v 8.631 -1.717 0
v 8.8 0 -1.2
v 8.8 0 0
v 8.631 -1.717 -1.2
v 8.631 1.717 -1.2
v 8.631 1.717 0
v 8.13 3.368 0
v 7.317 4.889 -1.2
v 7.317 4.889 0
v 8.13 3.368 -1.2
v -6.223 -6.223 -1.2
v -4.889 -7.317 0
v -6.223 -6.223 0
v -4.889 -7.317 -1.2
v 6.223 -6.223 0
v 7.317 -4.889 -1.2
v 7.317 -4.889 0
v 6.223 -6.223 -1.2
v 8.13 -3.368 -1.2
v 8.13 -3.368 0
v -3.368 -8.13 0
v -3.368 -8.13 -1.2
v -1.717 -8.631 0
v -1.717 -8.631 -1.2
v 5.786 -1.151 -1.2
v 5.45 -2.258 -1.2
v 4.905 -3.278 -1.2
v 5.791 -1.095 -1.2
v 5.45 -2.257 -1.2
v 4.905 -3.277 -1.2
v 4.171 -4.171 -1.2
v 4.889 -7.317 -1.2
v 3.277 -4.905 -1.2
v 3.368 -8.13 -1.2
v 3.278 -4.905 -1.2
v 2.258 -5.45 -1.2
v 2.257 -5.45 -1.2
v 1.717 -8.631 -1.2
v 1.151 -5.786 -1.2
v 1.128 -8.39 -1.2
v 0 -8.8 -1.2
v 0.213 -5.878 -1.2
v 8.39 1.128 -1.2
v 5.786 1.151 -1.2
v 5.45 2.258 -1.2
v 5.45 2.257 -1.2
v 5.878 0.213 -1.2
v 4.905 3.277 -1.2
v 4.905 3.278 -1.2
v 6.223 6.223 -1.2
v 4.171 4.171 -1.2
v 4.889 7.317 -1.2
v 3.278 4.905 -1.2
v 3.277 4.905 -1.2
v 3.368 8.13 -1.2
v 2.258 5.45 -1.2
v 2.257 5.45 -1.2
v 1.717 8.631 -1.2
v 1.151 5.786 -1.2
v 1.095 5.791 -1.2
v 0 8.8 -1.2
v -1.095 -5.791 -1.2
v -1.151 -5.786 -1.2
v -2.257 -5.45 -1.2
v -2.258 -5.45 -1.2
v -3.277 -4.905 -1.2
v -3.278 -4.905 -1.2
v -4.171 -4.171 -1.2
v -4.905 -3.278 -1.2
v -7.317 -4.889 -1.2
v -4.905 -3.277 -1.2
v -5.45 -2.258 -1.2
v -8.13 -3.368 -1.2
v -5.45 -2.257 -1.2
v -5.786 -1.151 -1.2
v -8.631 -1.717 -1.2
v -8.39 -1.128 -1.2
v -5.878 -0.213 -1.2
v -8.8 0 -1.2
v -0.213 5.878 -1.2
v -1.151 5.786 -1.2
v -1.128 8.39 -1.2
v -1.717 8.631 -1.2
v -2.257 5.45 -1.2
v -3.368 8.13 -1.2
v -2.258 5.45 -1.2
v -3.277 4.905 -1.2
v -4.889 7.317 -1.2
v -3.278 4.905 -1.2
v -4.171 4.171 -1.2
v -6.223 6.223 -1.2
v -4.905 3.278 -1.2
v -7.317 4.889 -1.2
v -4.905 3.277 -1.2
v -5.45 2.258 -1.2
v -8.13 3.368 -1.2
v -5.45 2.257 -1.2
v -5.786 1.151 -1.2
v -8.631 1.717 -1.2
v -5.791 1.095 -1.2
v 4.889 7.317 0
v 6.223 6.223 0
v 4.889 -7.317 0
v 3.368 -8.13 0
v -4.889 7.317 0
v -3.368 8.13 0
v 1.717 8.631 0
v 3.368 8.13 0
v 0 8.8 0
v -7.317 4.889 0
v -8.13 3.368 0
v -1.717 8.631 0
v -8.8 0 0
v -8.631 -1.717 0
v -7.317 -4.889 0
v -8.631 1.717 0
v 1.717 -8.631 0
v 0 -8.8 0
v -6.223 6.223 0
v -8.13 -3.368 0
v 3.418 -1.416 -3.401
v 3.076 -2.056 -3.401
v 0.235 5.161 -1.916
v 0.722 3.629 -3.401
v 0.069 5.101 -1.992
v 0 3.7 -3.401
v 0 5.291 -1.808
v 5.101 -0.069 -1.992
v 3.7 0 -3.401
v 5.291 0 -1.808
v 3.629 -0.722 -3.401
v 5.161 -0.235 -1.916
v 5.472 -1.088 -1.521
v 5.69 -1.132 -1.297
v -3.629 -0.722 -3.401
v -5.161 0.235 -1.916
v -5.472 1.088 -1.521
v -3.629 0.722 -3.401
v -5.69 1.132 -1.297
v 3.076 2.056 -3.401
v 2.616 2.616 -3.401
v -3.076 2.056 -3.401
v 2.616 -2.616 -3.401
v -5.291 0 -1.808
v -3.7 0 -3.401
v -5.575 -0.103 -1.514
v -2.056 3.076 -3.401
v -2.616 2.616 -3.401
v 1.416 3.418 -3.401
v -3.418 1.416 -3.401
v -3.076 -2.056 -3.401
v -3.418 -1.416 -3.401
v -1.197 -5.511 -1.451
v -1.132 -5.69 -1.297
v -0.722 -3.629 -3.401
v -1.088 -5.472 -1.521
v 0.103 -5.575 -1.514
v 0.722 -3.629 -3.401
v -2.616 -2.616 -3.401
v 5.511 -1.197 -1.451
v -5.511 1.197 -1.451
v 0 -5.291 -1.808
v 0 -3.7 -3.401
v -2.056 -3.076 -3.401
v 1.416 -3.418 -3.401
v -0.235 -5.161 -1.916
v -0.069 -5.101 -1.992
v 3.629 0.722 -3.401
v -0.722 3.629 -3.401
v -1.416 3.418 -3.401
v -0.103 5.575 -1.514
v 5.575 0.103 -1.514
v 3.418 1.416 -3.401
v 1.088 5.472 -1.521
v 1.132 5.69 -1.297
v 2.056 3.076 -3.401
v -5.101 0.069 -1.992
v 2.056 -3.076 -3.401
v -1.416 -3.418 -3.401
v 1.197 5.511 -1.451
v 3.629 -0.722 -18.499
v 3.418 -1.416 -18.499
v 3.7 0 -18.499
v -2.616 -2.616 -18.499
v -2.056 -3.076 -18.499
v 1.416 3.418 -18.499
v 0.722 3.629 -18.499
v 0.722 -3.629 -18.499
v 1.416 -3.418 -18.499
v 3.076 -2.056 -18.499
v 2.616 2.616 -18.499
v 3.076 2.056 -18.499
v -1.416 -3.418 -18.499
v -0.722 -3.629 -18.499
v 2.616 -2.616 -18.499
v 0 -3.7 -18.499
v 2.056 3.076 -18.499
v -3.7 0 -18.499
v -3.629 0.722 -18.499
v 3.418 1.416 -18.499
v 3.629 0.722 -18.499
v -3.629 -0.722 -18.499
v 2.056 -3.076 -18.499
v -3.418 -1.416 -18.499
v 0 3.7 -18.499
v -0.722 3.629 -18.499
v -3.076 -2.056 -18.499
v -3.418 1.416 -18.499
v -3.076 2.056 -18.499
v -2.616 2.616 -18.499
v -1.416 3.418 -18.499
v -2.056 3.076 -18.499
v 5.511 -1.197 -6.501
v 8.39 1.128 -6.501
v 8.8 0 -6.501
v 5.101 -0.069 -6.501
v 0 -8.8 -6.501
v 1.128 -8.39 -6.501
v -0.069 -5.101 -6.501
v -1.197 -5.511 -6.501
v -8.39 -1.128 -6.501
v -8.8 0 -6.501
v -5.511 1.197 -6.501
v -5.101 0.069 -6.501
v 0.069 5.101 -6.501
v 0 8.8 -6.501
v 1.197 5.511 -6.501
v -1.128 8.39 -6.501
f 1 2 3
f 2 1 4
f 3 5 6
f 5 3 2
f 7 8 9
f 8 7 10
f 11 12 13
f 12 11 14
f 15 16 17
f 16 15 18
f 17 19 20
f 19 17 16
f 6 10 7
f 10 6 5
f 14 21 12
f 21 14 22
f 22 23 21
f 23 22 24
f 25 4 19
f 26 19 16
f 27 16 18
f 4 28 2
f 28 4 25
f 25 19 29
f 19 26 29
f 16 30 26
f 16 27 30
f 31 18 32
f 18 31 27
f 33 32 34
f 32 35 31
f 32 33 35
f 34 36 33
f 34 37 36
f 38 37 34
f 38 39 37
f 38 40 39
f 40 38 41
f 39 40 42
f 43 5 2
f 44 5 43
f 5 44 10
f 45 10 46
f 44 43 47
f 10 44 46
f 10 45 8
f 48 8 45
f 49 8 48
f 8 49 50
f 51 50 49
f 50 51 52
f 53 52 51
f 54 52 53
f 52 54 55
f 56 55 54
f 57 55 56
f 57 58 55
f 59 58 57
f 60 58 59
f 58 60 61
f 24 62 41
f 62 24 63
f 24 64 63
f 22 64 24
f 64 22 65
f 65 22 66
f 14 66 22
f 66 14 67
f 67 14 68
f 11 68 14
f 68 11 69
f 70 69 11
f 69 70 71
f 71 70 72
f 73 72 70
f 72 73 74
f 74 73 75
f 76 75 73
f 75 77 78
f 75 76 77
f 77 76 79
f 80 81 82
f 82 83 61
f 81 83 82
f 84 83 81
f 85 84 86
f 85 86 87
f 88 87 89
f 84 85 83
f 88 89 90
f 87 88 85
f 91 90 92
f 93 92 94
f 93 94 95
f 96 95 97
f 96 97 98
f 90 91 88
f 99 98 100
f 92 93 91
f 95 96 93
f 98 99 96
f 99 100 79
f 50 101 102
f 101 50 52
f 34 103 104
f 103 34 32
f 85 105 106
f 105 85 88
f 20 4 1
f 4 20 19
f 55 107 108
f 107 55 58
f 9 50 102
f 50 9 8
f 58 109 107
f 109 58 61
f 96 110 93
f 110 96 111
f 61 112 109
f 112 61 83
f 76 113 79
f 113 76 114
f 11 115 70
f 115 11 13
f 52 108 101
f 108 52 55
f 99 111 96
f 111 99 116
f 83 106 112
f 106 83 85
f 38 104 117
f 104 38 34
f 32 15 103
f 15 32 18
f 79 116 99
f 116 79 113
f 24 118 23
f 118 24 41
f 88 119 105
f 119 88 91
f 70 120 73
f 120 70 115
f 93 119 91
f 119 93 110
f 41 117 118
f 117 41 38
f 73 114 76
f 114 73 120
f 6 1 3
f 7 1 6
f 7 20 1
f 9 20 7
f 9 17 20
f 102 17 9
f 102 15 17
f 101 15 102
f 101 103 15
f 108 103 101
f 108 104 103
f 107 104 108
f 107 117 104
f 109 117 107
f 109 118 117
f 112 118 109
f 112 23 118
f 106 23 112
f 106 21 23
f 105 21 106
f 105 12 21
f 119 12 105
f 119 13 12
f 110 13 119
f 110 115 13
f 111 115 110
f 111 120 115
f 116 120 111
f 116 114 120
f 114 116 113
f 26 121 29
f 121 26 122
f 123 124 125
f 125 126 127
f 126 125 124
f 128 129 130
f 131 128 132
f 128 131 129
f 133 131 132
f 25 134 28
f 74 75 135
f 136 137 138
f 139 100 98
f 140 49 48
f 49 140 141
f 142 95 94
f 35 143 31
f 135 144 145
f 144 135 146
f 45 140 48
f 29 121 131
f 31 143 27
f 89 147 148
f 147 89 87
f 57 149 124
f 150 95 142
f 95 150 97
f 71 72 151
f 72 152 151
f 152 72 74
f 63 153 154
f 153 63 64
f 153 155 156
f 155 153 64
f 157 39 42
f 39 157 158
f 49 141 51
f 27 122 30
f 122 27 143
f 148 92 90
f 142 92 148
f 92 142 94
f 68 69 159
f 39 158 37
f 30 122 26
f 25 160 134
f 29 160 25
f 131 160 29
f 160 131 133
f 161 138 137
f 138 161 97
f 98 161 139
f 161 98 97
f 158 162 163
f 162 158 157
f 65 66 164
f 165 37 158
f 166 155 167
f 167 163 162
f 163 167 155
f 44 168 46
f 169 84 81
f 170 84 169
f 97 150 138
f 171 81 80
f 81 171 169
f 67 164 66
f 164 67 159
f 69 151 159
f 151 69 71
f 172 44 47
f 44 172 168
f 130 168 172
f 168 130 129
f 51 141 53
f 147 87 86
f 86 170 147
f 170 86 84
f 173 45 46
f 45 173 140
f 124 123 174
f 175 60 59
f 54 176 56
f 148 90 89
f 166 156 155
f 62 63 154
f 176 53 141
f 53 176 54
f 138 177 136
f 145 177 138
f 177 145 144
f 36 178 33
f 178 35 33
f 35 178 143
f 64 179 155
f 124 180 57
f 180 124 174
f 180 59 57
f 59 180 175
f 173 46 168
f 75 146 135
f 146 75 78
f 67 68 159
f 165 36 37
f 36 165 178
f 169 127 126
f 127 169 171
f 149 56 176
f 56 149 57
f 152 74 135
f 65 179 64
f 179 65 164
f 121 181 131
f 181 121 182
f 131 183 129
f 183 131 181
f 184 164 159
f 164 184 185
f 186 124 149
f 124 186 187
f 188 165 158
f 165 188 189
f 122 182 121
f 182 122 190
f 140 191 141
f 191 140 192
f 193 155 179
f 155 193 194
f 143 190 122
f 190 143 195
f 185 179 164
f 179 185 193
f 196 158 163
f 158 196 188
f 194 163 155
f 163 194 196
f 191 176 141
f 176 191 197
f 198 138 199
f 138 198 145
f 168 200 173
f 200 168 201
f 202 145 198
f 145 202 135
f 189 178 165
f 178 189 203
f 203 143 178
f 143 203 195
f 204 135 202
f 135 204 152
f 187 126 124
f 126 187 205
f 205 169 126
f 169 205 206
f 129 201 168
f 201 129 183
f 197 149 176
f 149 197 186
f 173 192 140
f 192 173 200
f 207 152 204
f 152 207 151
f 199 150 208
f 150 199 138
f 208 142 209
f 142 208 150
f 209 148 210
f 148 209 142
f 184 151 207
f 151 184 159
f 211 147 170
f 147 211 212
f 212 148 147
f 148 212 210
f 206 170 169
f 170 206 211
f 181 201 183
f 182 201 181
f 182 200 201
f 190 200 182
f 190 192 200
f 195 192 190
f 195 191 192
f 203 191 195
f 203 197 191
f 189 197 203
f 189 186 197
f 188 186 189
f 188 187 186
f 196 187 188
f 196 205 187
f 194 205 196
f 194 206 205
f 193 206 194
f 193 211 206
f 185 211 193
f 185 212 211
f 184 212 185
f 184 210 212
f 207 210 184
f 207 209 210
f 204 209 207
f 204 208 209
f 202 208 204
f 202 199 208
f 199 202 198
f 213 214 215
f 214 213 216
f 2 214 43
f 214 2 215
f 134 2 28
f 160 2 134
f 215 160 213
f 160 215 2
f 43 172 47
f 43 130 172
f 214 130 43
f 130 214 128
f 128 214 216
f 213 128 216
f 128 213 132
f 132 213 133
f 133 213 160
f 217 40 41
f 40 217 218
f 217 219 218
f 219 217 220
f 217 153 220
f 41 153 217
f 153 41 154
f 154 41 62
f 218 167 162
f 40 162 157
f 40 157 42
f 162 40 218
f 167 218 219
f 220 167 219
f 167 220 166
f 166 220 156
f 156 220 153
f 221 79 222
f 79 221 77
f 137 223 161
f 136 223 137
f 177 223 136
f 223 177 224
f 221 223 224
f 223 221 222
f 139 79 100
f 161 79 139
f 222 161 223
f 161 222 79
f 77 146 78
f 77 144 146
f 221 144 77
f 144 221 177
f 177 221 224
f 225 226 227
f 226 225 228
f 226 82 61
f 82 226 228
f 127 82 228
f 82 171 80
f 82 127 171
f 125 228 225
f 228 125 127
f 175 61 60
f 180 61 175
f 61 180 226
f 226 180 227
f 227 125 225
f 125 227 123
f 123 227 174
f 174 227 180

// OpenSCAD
// Start: lazy_union
default_5_default_5();
// End: lazy_union

// Modules.

// 'PartMaterial undef-default - default 5.0'
module default_5_default_5() {
  // 'None : _combine_solids_and_holes'
  union() {
    // 'default : _combine_solids_and_holes'
    union() {
      // 'flat'
      multmatrix(m=[[1.0, 0.0, 0.0, 0.0], [0.0, -1.0, 0.0, 0.0], [0.0, 0.0, -1.0, 0.0], [0.0, 0.0, 0.0, 1.0]]) {
        // 'flat : _combine_solids_and_holes'
        union() {
          // 'flat'
          cylinder(h=1.2, r1=8.8, r2=8.8, center=false, $fn=32);
        }
      }
      // 'bevel'
      multmatrix(m=[[1.0, 0.0, 0.0, 0.0], [0.0, -1.0, 0.0, 0.0], [0.0, 0.0, -1.0, -1.199], [0.0, 0.0, 0.0, 1.0]]) {
        // 'bevel : _combine_solids_and_holes'
        union() {
          // 'bevel'
          cylinder(h=2.202, r1=5.9, r2=3.7, center=false, $fn=32);
        }
      }
      // 'shaft'
      multmatrix(m=[[1.0, 0.0, 0.0, 0.0], [0.0, -1.0, 0.0, 0.0], [0.0, 0.0, -1.0, -3.4000000000000004], [0.0, 0.0, 0.0, 1.0]]) {
        // 'shaft : _combine_solids_and_holes'
        union() {
          // 'shaft'
          cylinder(h=5.1, r1=3.7, r2=3.7, center=false, $fn=32);
        }
      }
      // 'shaft_extension'
      multmatrix(m=[[1.0, 0.0, 0.0, 0.0], [0.0, -1.0, 0.0, 0.0], [0.0, 0.0, -1.0, -8.498999999999999], [0.0, 0.0, 0.0, 1.0]]) {
        // 'shaft_extension'
        color(c=[1.0, 0.0, 0.0, 1.0]) {
          // 'shaft_extension : _combine_solids_and_holes'
          union() {
            // 'shaft_extension'
            cylinder(h=10.0, r1=3.7, r2=3.7, center=false, $fn=32);
          }
        }
      }
      // ('wing', 0)
      multmatrix(m=[[-0.9396926207859084, -0.3420201433256689, 0.0, 8.8], [-0.3420201433256689, 0.9396926207859084, 0.0, 0.0], [0.0, 0.0, -1.0, -0.001], [0.0, 0.0, 0.0, 1.0]]) {
        // ('wing', 0)
        color(c=[1.0, 0.0, 1.0, 1.0]) {
          // "('wing', 0) : _combine_solids_and_holes"
          union() {
            // ('wing', 0)
            cube(size=[3.5, 1.2, 6.5]);
          }
        }
      }
      // ('wing', 1)
      multmatrix(m=[[-0.3420201433256689, 0.9396926207859084, 0.0, 0.0], [0.9396926207859084, 0.3420201433256689, 0.0, -8.8], [0.0, 0.0, -1.0, -0.001], [0.0, 0.0, 0.0, 1.0]]) {
        // ('wing', 1)
        color(c=[1.0, 0.0, 1.0, 1.0]) {
          // "('wing', 1) : _combine_solids_and_holes"
          union() {
            // ('wing', 1)
            cube(size=[3.5, 1.2, 6.5]);
          }
        }
      }
      // ('wing', 2)
      multmatrix(m=[[0.9396926207859084, 0.3420201433256689, 0.0, -8.8], [0.3420201433256689, -0.9396926207859084, 0.0, 0.0], [0.0, 0.0, -1.0, -0.001], [0.0, 0.0, 0.0, 1.0]]) {
        // ('wing', 2)
        color(c=[1.0, 0.0, 1.0, 1.0]) {
          // "('wing', 2) : _combine_solids_and_holes"
          union() {
            // ('wing', 2)
            cube(size=[3.5, 1.2, 6.5]);
          }
        }
      }
      // ('wing', 3)
      multmatrix(m=[[0.3420201433256689, -0.9396926207859084, 0.0, 0.0], [-0.9396926207859084, -0.3420201433256689, 0.0, 8.8], [0.0, 0.0, -1.0, -0.001], [0.0, 0.0, 0.0, 1.0]]) {
        // ('wing', 3)
        color(c=[1.0, 0.0, 1.0, 1.0]) {
          // "('wing', 3) : _combine_solids_and_holes"
          union() {
            // ('wing', 3)
            cube(size=[3.5, 1.2, 6.5]);
          }
        }
      }
    }
  }
} // end module default_5_default_5
